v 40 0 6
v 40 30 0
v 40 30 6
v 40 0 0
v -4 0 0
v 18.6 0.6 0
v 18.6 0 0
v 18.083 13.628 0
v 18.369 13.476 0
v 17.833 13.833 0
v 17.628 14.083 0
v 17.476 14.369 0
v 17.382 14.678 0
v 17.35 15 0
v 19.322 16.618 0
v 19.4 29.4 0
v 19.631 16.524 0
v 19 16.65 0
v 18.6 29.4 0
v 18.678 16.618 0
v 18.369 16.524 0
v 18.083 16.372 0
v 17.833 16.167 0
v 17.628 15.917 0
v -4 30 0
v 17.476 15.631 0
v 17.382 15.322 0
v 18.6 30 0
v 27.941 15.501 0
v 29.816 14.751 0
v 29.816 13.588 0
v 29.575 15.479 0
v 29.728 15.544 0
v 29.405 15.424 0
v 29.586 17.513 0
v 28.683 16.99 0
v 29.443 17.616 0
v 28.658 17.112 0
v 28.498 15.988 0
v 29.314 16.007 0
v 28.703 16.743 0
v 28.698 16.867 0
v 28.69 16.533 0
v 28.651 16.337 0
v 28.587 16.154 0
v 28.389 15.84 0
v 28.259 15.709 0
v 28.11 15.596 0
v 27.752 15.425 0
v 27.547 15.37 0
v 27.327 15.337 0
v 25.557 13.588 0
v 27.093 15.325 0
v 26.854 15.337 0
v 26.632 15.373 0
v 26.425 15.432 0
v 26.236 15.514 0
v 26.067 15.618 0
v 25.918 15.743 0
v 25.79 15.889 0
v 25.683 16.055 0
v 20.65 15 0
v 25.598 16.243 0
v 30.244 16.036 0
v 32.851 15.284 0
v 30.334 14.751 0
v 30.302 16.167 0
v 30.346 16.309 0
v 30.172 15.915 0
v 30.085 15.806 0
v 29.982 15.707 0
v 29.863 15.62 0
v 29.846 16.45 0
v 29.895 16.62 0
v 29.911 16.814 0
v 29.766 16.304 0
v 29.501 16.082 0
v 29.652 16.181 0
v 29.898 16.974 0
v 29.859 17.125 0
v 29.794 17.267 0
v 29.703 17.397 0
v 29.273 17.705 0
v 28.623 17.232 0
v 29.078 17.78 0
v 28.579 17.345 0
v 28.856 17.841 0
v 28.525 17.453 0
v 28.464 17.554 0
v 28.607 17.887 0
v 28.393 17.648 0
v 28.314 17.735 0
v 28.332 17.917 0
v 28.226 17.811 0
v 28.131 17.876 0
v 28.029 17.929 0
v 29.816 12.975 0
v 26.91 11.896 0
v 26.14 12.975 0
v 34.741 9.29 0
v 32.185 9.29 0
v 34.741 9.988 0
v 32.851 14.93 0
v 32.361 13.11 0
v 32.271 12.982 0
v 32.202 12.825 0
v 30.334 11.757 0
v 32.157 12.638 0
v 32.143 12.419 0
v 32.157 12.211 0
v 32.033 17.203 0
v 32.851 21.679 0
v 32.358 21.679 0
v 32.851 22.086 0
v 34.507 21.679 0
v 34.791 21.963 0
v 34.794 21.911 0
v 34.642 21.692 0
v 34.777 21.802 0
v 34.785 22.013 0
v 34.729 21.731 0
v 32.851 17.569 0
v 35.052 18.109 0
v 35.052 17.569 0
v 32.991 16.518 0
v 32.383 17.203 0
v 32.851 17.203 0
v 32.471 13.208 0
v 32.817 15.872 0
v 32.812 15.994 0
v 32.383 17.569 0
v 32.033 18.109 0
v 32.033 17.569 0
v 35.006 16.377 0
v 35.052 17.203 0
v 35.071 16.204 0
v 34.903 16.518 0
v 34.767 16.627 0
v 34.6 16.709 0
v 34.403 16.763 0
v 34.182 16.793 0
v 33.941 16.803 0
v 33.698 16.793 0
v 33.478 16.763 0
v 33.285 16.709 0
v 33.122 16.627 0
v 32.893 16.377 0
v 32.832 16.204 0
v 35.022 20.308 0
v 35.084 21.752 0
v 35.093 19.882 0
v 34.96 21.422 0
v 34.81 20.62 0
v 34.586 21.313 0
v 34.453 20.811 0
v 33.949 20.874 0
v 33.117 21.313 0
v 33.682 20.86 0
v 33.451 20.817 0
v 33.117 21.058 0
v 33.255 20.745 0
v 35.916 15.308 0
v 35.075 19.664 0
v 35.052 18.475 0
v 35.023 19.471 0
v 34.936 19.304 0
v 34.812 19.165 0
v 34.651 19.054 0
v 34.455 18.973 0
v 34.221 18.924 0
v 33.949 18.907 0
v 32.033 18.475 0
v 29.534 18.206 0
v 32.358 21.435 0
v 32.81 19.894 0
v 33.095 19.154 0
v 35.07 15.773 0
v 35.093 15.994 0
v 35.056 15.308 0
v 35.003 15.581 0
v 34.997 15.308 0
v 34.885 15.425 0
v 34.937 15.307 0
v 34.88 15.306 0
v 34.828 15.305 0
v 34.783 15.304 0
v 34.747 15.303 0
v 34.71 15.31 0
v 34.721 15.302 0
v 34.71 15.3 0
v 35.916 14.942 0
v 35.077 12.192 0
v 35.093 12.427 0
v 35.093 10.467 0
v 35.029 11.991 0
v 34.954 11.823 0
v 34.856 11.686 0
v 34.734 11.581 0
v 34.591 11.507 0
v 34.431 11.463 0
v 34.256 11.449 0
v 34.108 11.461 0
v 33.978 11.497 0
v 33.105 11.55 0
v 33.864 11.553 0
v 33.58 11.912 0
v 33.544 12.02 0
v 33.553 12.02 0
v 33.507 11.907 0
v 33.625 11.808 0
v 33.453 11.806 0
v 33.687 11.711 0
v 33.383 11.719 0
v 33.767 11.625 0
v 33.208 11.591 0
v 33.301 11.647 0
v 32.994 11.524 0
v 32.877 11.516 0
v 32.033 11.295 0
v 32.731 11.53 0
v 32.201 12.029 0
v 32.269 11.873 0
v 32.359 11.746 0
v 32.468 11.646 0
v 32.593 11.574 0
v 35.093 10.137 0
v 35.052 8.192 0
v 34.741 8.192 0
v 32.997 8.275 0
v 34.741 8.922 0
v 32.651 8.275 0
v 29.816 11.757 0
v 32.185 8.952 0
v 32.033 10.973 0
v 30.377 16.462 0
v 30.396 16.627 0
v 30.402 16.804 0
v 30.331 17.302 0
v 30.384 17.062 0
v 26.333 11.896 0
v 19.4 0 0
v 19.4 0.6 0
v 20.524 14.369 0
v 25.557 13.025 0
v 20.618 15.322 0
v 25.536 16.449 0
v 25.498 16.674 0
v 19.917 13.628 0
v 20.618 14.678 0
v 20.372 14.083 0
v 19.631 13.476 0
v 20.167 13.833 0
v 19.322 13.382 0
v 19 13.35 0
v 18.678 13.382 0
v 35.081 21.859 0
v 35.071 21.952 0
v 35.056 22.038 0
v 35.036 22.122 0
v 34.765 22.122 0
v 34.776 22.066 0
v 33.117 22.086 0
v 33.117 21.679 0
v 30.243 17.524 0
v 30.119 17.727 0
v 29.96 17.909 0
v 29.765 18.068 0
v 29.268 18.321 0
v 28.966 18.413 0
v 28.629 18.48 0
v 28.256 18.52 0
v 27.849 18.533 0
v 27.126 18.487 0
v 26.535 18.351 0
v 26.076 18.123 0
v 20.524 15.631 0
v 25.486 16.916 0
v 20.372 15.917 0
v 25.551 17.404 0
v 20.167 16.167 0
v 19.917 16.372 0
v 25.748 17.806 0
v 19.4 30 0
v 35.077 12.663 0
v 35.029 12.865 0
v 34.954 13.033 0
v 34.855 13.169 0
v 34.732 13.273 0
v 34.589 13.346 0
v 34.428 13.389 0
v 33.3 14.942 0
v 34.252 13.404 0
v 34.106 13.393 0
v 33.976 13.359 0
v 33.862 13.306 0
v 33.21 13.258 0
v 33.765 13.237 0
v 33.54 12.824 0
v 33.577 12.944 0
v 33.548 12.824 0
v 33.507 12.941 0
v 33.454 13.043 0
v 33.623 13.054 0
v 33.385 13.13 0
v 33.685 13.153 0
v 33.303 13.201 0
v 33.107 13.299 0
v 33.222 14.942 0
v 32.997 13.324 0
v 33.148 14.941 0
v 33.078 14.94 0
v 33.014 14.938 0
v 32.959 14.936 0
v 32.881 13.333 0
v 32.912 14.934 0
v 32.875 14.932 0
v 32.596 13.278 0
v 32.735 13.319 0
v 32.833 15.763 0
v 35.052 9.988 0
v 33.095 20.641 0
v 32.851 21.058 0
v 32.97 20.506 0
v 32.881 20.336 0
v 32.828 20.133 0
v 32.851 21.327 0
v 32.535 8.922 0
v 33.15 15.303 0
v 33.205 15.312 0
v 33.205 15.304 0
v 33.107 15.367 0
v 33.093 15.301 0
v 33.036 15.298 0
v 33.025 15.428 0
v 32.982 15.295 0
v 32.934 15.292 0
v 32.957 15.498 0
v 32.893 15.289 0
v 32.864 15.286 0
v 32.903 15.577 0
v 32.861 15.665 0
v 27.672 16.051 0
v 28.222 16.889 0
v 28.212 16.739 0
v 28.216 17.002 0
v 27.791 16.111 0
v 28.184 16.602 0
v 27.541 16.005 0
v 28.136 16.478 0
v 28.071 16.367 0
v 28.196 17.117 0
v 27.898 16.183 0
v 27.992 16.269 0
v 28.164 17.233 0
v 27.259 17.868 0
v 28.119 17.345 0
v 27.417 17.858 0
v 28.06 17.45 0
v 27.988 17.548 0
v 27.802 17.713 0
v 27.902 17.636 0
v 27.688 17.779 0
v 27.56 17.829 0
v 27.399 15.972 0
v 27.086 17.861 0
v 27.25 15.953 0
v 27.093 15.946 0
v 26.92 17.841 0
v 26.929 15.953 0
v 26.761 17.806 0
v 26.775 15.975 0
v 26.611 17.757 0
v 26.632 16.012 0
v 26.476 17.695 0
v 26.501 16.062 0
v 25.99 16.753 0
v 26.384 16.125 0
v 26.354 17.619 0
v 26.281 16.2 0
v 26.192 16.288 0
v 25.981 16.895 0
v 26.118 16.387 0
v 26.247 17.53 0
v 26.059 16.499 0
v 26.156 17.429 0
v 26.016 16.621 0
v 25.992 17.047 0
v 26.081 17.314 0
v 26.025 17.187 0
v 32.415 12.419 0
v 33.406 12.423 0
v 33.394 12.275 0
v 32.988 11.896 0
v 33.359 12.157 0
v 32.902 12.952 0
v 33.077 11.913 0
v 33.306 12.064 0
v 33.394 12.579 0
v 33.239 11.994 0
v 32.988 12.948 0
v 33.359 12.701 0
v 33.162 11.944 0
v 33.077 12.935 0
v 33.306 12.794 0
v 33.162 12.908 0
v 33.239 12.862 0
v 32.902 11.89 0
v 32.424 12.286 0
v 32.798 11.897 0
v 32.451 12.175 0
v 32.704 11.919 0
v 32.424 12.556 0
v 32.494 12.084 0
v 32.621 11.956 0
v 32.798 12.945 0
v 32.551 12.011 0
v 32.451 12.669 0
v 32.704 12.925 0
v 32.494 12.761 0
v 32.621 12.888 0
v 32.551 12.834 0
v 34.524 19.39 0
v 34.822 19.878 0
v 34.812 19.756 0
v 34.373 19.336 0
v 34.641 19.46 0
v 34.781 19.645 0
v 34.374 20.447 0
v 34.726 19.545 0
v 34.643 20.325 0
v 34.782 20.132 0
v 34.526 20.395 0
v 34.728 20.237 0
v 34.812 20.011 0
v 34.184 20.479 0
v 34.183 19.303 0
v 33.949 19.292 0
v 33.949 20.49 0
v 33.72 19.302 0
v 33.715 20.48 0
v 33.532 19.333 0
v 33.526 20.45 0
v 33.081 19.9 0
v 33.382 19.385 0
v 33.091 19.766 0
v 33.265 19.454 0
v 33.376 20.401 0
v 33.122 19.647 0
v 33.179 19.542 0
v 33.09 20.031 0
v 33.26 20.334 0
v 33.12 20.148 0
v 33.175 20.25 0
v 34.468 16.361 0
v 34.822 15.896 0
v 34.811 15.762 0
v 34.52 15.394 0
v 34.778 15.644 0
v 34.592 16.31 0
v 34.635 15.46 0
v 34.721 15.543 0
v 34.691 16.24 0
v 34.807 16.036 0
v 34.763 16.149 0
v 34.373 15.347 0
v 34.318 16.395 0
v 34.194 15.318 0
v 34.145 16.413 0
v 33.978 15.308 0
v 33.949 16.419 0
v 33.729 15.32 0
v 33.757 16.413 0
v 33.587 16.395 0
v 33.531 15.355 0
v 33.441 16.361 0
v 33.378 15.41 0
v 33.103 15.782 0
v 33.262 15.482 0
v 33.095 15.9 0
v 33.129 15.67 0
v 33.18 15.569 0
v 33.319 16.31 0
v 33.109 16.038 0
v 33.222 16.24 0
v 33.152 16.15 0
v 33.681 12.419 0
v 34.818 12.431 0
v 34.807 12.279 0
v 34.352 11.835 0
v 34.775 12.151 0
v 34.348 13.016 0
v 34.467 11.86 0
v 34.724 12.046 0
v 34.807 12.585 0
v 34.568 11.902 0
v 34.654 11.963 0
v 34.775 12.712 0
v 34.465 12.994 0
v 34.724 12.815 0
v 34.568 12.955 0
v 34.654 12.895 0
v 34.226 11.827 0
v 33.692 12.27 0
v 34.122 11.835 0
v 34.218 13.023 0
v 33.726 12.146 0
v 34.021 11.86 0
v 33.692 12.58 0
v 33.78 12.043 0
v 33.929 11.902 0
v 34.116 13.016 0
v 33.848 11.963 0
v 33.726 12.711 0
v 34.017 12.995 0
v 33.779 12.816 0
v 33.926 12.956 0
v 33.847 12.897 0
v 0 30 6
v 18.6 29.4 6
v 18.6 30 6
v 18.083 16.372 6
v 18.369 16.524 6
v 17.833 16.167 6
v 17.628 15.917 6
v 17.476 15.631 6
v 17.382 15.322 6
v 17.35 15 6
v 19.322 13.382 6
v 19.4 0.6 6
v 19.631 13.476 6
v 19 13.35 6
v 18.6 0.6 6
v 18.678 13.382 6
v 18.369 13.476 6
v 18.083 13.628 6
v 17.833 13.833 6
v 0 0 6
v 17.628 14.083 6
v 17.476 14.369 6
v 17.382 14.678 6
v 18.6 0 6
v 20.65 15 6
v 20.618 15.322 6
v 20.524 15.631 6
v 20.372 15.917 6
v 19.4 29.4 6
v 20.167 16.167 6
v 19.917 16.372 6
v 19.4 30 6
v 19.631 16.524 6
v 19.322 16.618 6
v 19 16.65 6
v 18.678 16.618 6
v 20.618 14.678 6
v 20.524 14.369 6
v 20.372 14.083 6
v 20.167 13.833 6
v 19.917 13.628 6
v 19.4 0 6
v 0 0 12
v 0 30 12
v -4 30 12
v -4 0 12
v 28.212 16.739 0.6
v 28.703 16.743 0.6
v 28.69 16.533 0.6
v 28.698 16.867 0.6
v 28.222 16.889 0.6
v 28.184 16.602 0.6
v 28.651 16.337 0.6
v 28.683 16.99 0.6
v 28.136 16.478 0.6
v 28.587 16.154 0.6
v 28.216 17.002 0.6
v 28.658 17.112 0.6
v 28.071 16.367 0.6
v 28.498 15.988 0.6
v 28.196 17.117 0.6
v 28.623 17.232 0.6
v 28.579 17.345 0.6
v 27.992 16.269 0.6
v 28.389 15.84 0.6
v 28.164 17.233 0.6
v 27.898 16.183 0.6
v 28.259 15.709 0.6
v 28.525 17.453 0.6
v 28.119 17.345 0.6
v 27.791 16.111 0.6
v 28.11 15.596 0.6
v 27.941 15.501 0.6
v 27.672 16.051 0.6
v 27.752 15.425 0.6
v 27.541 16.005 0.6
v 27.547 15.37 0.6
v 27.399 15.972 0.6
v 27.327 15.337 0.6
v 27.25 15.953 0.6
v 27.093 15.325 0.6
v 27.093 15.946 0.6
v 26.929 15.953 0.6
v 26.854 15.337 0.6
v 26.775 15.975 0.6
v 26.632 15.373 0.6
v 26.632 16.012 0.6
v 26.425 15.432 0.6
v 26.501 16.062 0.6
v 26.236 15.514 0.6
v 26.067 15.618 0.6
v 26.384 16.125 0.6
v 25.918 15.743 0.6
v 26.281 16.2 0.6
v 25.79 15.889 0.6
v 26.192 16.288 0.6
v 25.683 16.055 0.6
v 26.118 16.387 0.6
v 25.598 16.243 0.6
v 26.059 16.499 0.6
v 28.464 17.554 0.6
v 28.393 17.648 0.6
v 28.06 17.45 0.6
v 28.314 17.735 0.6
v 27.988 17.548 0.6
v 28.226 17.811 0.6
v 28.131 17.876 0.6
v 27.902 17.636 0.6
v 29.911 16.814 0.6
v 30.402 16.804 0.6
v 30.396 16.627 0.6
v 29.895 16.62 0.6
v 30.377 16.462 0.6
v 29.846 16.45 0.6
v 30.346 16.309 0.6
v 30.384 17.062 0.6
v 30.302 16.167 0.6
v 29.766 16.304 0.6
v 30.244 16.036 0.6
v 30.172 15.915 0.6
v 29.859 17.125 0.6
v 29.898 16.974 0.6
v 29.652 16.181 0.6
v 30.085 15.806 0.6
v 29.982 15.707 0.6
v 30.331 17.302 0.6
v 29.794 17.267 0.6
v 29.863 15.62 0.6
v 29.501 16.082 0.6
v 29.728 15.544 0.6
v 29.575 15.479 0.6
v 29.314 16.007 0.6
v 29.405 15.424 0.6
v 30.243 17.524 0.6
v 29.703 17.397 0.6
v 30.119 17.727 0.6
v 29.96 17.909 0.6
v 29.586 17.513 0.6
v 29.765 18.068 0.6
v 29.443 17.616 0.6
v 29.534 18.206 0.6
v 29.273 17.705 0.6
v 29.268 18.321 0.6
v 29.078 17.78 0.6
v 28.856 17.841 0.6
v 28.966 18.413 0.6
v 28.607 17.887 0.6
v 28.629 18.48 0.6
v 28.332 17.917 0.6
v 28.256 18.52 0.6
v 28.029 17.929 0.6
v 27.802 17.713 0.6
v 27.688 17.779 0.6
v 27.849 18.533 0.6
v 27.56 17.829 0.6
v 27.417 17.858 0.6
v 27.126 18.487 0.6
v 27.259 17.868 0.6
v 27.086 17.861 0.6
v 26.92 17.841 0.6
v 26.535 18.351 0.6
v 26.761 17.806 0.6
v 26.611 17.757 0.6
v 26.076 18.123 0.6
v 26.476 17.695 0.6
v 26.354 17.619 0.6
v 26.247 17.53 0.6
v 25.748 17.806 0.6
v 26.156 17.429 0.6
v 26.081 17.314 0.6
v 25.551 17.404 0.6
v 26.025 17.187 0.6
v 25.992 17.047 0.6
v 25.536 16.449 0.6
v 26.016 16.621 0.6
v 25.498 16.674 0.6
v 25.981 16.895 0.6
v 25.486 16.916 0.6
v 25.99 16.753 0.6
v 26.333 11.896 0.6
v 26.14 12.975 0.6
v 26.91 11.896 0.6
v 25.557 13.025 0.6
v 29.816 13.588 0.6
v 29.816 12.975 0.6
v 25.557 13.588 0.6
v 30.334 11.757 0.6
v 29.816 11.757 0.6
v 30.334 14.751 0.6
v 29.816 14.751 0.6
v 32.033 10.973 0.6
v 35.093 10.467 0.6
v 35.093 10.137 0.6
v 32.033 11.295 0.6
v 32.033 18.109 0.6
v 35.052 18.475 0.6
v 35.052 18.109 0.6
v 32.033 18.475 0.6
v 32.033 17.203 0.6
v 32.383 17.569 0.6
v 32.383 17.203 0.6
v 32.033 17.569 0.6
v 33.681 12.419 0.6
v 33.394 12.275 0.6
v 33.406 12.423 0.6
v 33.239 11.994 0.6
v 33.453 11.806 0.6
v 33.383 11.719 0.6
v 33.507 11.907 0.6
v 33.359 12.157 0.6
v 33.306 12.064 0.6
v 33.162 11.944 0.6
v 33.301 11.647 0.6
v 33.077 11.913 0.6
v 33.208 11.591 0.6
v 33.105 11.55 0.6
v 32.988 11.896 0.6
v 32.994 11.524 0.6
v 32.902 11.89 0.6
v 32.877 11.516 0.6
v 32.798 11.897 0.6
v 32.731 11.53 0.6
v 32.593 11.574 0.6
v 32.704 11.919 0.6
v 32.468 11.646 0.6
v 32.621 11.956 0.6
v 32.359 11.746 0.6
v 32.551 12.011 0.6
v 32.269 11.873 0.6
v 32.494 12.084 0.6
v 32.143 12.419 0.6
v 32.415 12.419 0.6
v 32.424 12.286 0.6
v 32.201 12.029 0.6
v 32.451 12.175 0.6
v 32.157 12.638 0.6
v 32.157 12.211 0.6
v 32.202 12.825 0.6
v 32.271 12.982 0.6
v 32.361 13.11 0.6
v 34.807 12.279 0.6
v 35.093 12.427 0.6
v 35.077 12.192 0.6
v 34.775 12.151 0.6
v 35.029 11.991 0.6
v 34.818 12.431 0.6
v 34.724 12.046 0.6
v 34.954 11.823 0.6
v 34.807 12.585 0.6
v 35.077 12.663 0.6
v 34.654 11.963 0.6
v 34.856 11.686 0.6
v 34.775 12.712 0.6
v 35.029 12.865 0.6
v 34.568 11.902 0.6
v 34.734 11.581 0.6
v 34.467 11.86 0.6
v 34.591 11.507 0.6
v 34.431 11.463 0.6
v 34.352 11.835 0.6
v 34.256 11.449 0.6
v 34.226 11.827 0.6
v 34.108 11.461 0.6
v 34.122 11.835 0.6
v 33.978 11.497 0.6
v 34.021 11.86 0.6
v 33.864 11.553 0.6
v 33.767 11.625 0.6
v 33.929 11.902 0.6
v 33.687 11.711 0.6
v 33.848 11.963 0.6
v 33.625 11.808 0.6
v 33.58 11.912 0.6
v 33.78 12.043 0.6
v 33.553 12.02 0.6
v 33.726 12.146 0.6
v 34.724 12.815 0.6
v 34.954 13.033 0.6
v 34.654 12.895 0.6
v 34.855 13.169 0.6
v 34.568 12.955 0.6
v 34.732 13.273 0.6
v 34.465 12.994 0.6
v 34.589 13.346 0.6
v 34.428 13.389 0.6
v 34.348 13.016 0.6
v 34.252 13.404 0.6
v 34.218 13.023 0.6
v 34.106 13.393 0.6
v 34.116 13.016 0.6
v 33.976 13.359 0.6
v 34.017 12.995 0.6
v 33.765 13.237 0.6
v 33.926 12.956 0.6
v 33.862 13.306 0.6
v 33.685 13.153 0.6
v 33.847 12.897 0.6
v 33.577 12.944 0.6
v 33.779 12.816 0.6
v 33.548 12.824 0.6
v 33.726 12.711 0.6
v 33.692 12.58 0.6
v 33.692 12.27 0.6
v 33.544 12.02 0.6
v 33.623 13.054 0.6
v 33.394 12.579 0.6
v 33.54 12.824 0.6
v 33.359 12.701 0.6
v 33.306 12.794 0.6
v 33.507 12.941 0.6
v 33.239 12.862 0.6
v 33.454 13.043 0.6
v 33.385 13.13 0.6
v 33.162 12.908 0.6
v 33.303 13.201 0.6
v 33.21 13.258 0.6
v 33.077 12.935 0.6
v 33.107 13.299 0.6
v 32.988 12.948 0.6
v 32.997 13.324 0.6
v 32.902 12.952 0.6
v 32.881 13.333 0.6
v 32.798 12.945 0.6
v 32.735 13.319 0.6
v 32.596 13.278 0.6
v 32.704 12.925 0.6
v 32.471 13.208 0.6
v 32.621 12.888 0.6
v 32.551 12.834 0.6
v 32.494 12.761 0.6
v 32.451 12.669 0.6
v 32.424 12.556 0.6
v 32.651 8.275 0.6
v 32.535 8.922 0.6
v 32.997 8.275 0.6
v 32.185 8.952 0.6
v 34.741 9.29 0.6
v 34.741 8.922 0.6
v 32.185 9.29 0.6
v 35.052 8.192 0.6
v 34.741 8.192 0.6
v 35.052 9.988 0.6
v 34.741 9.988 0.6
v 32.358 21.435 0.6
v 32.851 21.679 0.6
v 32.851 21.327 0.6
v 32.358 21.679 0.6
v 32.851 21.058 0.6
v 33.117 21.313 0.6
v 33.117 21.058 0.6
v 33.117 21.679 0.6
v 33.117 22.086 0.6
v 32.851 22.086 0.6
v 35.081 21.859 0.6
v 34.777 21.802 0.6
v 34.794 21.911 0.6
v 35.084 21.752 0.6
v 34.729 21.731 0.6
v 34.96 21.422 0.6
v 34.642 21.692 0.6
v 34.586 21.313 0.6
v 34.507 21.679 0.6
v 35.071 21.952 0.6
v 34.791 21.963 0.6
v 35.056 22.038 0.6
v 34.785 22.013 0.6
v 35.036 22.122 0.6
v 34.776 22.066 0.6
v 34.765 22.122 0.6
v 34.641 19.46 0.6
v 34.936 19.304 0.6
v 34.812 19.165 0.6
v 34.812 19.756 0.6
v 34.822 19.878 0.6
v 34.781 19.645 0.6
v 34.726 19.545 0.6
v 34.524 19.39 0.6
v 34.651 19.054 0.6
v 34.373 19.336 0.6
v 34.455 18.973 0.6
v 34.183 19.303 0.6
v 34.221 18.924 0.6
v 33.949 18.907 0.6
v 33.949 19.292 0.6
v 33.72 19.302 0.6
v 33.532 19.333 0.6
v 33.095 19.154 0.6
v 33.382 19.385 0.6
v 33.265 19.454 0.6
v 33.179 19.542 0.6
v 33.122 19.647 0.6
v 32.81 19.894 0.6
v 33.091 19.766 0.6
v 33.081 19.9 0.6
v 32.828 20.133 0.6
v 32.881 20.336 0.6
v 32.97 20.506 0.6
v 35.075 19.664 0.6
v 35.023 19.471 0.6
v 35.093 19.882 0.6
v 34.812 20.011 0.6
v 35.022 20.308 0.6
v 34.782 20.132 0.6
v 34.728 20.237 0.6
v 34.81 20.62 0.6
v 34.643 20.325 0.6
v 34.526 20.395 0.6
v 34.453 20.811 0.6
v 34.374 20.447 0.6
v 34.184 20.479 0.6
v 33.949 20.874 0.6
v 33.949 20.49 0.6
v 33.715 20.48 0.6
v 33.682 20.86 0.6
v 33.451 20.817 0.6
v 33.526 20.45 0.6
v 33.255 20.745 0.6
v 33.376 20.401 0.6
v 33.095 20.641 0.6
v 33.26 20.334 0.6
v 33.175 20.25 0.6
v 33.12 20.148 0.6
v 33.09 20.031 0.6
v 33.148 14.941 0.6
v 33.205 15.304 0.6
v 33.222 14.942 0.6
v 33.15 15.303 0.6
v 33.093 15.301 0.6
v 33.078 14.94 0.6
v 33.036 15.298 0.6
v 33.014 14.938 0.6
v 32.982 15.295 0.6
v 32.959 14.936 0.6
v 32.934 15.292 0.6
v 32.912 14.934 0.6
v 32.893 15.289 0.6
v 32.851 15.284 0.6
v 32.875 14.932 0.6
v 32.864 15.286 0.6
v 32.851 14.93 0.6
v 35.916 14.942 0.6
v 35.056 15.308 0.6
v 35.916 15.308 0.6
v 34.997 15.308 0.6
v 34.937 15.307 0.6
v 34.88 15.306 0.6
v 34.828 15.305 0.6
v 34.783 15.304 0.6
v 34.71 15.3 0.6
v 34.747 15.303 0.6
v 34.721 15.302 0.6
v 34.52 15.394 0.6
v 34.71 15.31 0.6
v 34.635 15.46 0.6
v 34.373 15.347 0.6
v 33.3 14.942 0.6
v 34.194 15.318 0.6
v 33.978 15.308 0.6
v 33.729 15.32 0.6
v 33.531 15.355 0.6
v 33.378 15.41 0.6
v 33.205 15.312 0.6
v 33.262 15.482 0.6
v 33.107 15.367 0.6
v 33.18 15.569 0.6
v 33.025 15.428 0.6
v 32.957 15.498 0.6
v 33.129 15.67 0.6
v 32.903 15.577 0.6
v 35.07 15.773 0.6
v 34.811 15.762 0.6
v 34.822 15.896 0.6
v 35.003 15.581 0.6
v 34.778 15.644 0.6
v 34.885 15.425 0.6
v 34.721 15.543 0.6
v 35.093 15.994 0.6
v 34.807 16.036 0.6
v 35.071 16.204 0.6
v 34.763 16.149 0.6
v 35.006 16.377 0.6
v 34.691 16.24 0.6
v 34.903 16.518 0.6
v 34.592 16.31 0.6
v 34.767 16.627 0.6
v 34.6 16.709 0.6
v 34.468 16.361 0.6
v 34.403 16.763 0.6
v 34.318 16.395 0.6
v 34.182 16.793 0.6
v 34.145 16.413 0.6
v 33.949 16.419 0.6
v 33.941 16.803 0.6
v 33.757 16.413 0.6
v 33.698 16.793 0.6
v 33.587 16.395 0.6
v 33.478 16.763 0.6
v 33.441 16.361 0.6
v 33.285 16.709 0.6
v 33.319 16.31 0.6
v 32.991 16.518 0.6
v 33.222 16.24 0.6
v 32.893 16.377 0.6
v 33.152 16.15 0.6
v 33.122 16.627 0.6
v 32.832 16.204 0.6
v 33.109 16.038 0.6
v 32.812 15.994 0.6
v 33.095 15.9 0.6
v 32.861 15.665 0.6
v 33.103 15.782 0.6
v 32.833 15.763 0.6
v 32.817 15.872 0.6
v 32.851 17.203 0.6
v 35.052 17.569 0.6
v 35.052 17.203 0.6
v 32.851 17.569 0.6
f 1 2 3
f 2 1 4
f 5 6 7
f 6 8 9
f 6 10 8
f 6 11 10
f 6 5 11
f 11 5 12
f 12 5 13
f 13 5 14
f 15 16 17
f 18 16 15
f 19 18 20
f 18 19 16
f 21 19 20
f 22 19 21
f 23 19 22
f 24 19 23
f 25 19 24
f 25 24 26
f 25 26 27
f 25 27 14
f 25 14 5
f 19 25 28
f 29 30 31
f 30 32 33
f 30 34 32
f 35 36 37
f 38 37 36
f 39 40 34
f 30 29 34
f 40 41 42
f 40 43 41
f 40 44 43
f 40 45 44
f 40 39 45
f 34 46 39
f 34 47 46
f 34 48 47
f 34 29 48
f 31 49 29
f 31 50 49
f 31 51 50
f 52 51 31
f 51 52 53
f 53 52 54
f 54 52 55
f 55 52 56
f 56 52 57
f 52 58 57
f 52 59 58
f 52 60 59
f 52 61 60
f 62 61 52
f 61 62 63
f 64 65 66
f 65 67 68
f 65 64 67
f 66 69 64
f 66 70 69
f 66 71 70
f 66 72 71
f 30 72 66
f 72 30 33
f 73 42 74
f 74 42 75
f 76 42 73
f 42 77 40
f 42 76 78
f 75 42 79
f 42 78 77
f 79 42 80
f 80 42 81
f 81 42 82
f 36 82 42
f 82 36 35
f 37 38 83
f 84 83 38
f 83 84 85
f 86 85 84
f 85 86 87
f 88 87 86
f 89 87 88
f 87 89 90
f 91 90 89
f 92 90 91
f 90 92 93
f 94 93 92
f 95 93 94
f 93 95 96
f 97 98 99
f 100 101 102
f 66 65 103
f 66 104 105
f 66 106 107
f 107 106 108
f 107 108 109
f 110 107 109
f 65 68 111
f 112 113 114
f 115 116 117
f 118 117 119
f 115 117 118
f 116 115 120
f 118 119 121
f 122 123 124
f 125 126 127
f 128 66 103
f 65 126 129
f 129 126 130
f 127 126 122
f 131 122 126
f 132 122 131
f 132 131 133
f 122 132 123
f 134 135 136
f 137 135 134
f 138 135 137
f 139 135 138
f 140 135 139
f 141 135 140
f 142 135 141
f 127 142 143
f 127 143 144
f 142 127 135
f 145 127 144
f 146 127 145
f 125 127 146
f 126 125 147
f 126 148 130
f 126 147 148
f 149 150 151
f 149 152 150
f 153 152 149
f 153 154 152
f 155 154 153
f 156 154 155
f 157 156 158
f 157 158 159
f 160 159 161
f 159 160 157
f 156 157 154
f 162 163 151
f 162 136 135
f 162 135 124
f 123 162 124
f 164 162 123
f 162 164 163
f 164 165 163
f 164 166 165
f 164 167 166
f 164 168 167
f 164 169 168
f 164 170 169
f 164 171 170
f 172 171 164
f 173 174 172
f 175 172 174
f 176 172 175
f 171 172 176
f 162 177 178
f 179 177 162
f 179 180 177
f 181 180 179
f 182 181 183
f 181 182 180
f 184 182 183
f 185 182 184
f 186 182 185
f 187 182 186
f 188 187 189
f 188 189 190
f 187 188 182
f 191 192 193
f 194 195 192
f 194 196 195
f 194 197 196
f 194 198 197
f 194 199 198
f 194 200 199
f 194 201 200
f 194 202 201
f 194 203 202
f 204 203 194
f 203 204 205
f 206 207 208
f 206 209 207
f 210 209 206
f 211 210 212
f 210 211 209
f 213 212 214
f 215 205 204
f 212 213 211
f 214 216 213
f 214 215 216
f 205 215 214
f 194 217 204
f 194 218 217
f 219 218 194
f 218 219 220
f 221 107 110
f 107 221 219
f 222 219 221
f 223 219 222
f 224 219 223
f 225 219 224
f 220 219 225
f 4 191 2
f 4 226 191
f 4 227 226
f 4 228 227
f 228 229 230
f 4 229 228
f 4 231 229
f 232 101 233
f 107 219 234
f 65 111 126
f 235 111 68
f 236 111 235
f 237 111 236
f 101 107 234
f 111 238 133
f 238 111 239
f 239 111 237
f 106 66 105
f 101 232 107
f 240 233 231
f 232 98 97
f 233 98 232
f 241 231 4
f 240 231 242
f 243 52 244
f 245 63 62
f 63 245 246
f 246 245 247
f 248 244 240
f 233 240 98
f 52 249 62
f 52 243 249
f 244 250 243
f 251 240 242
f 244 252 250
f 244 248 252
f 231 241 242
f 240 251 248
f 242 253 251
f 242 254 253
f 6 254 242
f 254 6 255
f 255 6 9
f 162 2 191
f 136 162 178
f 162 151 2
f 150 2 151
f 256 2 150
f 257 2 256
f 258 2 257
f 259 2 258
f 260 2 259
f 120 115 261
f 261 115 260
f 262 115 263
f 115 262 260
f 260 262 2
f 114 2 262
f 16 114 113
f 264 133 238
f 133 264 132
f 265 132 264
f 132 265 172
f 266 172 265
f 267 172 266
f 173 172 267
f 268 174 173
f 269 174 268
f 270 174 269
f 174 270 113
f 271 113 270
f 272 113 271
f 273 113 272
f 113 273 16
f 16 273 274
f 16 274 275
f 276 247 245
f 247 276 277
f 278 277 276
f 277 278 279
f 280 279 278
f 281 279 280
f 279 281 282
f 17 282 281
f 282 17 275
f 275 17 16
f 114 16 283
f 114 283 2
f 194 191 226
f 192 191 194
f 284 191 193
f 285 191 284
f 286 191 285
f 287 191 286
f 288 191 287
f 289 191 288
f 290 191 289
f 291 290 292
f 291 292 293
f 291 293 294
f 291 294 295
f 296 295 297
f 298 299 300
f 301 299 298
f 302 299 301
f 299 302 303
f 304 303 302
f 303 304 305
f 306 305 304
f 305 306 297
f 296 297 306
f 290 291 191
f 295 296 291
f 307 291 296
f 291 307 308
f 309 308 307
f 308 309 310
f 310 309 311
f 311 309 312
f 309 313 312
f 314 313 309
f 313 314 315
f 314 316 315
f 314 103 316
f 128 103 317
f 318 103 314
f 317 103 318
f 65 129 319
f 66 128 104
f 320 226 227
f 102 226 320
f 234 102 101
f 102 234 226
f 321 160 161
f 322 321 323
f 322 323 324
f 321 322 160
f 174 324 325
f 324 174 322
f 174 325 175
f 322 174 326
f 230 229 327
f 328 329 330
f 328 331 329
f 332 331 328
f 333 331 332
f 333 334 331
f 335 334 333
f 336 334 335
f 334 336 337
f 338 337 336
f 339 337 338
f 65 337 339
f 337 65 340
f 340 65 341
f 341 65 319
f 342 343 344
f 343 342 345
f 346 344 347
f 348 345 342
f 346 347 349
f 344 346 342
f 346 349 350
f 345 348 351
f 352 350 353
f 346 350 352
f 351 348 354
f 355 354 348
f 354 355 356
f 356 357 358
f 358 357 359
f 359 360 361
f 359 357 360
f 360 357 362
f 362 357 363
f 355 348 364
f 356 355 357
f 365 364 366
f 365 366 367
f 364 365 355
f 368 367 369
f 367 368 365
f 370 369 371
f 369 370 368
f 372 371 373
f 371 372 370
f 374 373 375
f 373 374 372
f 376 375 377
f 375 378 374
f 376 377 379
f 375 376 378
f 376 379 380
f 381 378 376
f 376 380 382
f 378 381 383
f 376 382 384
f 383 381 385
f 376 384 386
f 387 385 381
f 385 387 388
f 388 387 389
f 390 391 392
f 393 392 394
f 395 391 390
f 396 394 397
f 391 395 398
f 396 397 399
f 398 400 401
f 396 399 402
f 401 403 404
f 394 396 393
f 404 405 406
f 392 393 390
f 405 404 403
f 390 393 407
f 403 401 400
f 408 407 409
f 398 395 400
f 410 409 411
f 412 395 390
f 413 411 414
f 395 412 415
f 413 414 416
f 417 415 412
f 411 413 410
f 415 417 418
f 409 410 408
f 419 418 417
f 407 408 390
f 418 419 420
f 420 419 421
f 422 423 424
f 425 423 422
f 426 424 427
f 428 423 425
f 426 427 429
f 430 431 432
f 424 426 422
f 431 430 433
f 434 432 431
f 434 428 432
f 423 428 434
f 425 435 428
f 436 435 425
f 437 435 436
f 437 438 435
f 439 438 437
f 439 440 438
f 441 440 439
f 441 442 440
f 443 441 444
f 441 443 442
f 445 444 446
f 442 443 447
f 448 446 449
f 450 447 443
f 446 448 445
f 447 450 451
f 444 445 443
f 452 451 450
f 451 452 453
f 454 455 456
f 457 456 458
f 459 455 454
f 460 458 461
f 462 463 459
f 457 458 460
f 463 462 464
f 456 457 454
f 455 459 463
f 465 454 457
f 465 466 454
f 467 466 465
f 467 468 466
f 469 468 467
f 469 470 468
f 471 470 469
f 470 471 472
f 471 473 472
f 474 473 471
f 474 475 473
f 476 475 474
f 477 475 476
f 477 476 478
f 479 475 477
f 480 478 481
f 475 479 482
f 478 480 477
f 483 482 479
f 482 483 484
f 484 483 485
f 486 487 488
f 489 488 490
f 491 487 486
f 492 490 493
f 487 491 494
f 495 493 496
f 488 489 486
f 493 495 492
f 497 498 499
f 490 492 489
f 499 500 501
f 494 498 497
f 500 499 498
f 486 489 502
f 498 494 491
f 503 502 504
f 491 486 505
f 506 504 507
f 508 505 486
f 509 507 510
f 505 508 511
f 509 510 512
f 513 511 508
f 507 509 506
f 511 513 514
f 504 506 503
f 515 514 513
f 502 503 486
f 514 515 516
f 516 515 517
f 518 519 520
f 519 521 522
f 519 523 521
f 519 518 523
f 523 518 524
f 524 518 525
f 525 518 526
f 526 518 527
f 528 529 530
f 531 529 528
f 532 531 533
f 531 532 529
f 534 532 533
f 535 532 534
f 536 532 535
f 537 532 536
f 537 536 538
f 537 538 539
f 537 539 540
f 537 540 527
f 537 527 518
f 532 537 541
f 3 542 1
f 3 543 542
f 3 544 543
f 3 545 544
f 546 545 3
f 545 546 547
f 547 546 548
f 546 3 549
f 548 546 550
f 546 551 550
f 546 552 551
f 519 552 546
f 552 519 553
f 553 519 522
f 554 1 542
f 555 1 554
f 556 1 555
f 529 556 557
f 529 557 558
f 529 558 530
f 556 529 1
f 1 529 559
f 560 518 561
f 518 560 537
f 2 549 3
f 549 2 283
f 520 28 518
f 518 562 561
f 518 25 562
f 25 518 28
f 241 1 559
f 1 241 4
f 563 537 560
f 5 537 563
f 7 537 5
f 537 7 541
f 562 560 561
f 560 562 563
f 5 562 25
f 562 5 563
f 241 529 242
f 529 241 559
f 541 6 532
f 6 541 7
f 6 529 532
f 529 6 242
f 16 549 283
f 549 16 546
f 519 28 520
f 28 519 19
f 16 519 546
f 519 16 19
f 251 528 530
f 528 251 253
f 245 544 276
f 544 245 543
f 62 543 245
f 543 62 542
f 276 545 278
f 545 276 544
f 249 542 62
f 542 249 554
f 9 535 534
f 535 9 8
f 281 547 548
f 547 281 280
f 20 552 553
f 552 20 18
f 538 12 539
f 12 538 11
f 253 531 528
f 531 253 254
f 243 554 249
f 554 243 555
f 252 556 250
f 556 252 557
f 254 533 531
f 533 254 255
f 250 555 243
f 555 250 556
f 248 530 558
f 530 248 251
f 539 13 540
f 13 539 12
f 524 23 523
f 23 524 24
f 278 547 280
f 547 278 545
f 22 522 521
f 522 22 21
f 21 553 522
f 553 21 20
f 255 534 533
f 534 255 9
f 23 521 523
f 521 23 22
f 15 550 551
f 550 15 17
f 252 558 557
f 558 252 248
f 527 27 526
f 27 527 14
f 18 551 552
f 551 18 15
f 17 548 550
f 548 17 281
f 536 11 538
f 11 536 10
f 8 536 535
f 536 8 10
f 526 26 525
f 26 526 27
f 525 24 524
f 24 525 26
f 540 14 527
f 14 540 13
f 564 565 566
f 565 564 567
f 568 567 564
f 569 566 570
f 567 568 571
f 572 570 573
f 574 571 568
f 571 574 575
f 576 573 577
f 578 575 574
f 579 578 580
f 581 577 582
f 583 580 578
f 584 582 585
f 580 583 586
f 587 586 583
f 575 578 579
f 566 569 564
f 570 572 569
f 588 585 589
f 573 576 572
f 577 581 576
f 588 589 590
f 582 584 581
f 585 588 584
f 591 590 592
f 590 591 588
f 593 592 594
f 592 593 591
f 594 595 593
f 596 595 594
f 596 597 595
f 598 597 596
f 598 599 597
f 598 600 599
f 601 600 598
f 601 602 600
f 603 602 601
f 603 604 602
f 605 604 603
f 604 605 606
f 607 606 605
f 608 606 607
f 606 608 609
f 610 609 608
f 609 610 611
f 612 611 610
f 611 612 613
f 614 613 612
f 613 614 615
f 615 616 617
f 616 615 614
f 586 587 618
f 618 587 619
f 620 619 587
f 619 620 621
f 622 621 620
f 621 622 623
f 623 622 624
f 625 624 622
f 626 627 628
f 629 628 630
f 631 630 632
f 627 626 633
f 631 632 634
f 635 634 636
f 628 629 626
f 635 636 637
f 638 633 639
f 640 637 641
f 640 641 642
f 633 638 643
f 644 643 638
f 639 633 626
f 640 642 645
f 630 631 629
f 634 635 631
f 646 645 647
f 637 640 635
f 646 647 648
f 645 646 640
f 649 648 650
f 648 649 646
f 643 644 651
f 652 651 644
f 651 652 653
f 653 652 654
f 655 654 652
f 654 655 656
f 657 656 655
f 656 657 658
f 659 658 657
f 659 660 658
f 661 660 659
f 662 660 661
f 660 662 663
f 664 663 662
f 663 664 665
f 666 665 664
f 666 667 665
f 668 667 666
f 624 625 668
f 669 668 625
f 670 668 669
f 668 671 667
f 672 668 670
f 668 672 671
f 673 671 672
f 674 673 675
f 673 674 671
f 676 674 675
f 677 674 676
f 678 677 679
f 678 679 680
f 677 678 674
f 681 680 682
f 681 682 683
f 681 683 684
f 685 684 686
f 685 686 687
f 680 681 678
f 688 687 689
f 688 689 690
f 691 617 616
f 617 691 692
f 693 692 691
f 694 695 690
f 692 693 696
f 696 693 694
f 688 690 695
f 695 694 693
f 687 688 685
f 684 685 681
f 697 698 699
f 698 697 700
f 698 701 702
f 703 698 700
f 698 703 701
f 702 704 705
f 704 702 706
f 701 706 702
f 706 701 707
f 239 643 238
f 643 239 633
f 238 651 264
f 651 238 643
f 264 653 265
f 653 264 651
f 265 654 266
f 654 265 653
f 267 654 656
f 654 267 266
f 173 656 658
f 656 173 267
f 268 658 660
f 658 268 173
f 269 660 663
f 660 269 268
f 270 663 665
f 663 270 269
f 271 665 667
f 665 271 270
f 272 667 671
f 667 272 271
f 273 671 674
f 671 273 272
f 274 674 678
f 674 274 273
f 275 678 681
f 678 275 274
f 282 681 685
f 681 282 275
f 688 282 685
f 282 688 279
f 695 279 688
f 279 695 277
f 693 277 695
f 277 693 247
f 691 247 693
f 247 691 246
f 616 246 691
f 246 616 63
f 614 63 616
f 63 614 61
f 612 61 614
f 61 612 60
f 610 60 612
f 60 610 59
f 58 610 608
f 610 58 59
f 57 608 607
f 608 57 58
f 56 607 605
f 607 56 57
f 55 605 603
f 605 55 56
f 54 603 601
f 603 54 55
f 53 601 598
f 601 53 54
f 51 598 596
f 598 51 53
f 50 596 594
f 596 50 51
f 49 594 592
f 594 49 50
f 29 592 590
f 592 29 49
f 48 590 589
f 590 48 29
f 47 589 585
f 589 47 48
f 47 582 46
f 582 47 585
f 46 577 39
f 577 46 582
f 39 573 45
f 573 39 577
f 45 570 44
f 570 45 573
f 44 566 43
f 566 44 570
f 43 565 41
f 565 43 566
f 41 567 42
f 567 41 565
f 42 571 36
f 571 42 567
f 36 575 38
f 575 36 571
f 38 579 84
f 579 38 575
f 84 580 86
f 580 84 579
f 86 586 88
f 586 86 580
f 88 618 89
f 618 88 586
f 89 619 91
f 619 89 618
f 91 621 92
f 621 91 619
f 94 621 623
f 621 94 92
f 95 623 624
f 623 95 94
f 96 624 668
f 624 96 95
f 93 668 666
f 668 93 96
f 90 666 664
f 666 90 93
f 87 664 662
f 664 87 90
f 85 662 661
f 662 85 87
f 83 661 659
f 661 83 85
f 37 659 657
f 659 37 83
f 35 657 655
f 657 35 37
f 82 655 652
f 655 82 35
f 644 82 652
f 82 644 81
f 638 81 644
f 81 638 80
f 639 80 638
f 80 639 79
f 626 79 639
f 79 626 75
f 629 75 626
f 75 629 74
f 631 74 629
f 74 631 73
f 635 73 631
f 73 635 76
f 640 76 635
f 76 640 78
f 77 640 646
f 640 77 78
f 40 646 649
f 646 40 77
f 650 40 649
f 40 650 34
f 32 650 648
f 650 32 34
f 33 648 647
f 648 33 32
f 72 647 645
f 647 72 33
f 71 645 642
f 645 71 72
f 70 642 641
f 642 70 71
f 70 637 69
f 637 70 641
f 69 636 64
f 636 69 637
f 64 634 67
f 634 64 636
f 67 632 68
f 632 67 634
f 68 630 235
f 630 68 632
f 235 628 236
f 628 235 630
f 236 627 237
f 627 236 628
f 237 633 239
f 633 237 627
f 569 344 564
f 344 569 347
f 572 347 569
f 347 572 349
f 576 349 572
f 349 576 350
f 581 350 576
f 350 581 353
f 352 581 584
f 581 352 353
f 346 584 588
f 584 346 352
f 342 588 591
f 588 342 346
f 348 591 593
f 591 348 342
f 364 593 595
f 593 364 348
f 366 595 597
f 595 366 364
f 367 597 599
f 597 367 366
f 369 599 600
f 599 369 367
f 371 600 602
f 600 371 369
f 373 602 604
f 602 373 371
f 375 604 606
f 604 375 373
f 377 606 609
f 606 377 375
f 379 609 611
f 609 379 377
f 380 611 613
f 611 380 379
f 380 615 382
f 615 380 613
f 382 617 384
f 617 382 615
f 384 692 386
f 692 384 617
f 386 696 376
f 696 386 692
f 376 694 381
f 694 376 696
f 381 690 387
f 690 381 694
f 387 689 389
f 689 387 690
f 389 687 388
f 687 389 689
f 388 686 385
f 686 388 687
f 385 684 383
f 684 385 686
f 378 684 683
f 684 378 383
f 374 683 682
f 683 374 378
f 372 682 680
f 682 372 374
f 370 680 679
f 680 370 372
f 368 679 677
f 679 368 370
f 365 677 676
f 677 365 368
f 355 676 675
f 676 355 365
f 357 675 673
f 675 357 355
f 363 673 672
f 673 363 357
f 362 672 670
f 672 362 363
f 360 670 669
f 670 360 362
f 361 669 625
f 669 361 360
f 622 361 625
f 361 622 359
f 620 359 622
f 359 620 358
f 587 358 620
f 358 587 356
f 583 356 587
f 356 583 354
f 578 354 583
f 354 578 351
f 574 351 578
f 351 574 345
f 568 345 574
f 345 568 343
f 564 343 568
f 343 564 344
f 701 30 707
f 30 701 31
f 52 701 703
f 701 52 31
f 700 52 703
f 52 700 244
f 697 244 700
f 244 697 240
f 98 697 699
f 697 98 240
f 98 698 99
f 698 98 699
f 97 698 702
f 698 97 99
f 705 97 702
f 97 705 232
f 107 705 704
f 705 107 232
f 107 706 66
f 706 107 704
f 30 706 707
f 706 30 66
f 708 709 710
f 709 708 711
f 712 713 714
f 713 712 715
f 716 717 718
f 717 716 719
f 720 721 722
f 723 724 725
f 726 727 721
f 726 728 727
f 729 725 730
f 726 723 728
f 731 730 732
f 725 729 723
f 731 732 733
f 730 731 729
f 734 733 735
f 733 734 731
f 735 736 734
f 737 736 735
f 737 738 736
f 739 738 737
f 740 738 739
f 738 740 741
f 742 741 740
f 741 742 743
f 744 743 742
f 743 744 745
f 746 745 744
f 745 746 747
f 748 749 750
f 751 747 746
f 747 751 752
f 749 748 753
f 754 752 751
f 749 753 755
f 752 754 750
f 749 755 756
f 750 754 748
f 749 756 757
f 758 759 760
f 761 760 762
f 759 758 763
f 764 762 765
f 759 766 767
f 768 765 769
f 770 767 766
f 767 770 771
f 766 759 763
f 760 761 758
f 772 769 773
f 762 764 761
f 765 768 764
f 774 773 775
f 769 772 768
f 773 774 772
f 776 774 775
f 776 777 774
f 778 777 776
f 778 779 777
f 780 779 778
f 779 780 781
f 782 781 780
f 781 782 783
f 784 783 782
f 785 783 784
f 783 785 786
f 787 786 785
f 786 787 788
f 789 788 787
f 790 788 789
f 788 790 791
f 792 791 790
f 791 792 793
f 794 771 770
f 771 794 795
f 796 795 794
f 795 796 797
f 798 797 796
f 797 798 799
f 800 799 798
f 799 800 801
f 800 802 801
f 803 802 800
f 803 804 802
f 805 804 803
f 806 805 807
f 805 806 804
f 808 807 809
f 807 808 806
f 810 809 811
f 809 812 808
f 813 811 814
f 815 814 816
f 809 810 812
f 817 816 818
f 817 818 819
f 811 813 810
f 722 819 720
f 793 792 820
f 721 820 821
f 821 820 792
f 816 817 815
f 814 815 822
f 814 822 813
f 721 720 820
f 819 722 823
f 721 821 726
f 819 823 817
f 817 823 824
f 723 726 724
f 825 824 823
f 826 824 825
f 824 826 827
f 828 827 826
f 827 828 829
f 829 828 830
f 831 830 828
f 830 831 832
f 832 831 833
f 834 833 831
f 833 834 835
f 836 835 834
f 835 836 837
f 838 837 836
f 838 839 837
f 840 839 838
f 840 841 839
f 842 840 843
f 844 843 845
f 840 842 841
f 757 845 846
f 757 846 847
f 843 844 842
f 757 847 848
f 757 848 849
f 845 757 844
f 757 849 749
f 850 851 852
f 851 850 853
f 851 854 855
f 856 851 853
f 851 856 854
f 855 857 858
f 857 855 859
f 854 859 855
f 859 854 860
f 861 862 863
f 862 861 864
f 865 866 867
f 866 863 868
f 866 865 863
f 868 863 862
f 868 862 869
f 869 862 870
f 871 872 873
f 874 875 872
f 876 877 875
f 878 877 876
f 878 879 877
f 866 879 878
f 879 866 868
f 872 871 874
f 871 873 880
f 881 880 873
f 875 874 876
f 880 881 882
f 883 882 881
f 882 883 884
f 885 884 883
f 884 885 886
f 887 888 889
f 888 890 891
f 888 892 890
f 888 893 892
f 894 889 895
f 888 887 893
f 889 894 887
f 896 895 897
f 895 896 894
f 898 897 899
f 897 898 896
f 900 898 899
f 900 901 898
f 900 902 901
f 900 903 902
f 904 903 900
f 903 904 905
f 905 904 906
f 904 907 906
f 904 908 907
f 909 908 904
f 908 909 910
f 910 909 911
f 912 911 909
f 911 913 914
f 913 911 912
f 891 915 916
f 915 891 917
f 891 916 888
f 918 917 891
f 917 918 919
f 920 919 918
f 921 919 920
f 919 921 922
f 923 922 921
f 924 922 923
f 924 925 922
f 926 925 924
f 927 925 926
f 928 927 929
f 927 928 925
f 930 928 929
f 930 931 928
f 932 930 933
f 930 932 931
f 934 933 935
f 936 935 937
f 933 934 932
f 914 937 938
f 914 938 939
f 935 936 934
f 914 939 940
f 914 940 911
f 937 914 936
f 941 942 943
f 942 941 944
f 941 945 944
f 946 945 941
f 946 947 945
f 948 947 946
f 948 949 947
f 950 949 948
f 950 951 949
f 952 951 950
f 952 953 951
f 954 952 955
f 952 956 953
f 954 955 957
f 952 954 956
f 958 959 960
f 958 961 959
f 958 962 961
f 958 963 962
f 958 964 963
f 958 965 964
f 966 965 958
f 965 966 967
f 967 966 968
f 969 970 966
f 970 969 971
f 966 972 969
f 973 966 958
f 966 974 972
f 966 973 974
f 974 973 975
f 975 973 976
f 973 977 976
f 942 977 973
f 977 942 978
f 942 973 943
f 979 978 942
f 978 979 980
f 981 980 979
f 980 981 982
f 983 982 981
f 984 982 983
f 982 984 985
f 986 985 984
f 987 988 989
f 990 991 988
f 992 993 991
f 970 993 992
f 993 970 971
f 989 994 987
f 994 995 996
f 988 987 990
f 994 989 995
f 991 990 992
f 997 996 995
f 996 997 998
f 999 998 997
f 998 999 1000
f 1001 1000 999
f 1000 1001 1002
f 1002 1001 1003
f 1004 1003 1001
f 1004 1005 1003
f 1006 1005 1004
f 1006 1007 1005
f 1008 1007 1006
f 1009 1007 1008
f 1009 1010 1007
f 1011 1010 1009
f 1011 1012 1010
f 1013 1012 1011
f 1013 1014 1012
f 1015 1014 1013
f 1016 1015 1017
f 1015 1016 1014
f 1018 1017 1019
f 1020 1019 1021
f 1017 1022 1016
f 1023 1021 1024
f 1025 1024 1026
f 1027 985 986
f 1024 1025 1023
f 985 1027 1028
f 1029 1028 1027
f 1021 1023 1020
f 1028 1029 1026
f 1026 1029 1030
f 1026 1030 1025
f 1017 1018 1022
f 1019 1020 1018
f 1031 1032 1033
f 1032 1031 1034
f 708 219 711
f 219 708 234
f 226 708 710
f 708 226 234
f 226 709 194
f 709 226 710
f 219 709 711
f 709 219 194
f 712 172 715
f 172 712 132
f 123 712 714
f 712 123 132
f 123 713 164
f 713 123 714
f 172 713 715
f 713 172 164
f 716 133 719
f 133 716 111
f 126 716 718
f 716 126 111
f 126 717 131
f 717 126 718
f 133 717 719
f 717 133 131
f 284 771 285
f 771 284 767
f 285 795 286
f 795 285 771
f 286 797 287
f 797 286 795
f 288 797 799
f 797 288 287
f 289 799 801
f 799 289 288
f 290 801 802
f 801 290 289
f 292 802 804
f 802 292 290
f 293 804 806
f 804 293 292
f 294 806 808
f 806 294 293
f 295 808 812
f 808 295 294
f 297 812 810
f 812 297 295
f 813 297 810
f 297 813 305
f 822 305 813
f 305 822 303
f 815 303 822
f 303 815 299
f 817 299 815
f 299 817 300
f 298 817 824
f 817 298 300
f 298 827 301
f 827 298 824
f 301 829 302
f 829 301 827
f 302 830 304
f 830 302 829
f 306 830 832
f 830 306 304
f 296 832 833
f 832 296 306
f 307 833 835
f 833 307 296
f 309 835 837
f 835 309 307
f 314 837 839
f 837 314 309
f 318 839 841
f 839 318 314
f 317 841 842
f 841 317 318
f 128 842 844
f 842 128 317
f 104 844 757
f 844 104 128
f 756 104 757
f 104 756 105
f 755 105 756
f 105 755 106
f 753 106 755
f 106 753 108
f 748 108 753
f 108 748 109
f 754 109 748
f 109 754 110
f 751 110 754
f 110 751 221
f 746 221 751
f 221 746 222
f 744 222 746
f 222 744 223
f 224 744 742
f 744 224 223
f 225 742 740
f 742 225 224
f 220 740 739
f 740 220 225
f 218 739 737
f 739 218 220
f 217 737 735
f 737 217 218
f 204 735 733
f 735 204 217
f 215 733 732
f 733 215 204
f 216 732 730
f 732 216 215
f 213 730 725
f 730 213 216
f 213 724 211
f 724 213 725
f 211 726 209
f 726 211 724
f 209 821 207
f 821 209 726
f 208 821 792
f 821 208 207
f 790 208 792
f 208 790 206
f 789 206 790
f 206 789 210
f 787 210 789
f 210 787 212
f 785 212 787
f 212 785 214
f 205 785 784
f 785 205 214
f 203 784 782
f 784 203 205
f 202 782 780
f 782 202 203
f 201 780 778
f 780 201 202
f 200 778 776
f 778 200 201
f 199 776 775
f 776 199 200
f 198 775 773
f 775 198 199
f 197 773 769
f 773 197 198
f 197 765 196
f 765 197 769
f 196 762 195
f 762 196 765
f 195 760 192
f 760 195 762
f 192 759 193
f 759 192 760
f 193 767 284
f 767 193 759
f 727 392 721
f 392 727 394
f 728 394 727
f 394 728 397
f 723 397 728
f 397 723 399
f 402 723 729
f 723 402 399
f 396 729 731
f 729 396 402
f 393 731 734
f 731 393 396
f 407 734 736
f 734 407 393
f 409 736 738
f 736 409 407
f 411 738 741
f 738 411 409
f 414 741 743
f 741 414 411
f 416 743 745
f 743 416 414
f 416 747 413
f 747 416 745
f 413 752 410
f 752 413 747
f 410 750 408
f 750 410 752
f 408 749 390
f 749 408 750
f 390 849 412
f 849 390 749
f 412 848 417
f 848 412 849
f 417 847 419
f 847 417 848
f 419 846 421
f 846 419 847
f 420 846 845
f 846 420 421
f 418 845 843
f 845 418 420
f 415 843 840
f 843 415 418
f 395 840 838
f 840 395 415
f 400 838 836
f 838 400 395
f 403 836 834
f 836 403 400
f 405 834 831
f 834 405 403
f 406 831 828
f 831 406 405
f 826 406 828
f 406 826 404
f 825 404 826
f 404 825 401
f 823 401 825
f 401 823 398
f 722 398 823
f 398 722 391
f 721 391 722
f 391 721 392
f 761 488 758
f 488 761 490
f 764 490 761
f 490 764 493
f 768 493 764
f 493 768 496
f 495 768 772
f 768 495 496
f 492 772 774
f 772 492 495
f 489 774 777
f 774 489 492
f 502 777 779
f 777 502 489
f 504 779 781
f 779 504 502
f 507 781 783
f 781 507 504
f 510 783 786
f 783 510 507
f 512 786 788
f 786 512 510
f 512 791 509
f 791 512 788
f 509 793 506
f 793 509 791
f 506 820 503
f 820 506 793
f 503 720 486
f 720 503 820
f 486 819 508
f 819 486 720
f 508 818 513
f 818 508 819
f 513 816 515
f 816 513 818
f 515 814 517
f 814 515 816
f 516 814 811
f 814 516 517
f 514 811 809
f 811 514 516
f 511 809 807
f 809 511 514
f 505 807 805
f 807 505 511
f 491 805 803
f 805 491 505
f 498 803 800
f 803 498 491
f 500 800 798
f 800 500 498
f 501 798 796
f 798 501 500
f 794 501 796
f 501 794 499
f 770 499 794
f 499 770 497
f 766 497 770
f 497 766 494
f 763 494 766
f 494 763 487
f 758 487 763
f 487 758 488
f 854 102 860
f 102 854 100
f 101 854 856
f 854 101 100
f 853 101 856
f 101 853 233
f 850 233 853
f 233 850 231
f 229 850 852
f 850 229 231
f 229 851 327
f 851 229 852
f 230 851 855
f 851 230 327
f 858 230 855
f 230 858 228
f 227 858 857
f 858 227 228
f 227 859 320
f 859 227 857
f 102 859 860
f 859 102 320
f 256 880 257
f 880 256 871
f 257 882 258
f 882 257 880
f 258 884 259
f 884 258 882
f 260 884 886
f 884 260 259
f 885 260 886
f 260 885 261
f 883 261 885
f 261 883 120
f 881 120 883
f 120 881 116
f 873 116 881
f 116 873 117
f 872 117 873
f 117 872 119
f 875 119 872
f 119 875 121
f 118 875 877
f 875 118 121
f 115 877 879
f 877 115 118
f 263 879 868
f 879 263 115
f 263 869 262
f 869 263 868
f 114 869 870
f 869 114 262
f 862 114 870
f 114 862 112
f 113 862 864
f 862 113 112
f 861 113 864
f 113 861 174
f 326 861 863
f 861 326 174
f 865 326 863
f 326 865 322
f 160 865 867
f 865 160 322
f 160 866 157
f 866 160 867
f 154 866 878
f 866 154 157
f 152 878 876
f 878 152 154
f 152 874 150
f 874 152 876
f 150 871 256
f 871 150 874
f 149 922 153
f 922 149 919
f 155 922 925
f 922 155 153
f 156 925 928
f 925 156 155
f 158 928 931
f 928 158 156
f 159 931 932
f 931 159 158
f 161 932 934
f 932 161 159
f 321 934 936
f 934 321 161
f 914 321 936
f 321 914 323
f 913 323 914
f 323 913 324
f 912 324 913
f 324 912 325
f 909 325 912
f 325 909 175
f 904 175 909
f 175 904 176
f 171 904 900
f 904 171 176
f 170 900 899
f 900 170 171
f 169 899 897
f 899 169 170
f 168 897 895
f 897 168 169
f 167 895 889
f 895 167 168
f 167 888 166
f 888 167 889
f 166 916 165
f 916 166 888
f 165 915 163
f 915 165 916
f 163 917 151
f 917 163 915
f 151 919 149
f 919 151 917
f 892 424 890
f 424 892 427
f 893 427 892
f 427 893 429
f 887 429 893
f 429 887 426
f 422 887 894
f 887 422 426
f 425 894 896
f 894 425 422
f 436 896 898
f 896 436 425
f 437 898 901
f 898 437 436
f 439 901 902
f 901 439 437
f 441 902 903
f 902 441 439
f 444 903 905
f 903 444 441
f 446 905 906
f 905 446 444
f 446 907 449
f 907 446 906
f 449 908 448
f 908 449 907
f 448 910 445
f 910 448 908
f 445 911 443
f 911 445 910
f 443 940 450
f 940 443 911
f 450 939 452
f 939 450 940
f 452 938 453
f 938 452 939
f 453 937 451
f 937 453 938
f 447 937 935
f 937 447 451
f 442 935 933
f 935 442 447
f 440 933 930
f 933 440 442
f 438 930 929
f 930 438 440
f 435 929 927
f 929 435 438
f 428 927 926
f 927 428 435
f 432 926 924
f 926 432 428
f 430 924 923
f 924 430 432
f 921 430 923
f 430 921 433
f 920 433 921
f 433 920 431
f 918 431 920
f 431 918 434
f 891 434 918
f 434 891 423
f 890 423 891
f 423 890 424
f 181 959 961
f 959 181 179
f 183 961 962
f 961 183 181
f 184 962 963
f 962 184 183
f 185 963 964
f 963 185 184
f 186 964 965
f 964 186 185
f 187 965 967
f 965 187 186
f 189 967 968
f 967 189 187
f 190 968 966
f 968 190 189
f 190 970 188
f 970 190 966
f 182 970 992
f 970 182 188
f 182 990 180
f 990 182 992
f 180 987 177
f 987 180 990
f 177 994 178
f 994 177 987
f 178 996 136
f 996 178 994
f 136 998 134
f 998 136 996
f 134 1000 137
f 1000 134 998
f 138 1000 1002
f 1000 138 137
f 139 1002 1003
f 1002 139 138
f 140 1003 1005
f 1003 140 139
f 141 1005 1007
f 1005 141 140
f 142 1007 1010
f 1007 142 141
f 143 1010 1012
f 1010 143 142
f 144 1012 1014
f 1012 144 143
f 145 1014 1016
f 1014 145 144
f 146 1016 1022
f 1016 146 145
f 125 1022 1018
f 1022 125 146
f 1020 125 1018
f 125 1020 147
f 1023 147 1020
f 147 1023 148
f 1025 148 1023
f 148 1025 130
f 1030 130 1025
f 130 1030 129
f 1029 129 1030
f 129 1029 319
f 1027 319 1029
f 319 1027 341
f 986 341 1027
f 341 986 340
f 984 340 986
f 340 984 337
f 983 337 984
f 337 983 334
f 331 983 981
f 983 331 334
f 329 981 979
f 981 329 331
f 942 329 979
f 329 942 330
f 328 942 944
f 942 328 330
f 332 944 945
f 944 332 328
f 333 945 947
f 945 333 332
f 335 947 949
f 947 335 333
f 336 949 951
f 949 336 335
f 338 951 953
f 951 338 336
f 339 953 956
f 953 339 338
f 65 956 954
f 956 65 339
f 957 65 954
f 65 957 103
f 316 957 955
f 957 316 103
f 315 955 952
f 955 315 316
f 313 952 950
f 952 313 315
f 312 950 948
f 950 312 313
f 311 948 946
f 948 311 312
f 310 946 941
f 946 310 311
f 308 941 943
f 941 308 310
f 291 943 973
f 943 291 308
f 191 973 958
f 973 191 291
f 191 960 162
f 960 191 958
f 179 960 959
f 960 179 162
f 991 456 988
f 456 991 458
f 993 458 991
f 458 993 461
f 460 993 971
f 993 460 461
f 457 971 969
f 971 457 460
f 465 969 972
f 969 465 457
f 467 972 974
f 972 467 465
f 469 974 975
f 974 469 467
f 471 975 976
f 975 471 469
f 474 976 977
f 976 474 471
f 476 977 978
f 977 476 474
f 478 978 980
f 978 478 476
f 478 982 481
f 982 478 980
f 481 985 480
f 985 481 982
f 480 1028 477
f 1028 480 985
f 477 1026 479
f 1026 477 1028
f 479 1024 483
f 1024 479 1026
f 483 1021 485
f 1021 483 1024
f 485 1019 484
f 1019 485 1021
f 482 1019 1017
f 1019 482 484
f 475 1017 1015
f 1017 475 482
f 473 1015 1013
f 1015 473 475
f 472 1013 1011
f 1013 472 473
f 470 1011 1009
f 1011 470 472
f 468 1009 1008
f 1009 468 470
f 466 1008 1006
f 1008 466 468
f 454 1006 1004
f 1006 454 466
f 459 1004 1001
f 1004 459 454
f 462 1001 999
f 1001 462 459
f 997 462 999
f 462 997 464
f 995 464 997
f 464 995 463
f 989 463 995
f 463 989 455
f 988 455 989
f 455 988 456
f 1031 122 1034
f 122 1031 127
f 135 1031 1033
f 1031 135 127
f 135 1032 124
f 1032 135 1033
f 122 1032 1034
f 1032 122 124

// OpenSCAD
// Rail drill jig. Hooks over the flat leg's free edge of the angle (the lip's inner face is
// the zero, same as the marking gauge) and puts a 1/8 in bore exactly 19 mm in: the screw
// line. Slide it to a station line, line the scribe marks up with it, hold it down and drill
// the 1/8 in pilot through the bore. The bore keeps the bit square and it cannot wander on
// the steel. Pull the jig off and open the hole to 7/32 in: the bit follows the pilot. Nineteen
// holes, one jig. The body is 6 mm thick, enough to start the bit square.
// PRINT orientation: body on the bed, lip up, no supports. PETG (the bore lasts longer).

d19    = 19;     // screw line from the leg's free edge
body_t = 6; lip_h = 6; lip_t = 4;
w      = 30;     // along the rail
len    = 40;     // from the lip across the leg
bore   = 3.3;    // 1/8 in bit, running fit
module jig() {   // use orientation: body on the leg's top face, lip hanging over the free edge
    difference() {
        union() {
            cube([len, w, body_t]);
            translate([-lip_t, 0, -lip_h]) cube([lip_t, w, lip_h + body_t]);
        }
        translate([d19, w / 2, -1]) cylinder(d = bore, h = body_t + 2, $fn = 32);
        for (y = [-1, w - 0.6]) translate([d19 - 0.4, y, -1]) cube([0.8, 1.6, body_t + 2]);                     // sight grooves down both sides, on the bore's centre line
        translate([d19 + 9, w / 2, body_t - 0.6]) rotate([0, 0, 90]) linear_extrude(1) text("19", size = 5, halign = "center", valign = "center");
        translate([len - 6, w / 2, body_t - 0.6]) rotate([0, 0, 90]) linear_extrude(1) text("1/8 pilot", size = 3, halign = "center", valign = "center");
    }
}
translate([0, 0, body_t]) mirror([0, 0, 1]) jig();   // flipped for printing: lip up
